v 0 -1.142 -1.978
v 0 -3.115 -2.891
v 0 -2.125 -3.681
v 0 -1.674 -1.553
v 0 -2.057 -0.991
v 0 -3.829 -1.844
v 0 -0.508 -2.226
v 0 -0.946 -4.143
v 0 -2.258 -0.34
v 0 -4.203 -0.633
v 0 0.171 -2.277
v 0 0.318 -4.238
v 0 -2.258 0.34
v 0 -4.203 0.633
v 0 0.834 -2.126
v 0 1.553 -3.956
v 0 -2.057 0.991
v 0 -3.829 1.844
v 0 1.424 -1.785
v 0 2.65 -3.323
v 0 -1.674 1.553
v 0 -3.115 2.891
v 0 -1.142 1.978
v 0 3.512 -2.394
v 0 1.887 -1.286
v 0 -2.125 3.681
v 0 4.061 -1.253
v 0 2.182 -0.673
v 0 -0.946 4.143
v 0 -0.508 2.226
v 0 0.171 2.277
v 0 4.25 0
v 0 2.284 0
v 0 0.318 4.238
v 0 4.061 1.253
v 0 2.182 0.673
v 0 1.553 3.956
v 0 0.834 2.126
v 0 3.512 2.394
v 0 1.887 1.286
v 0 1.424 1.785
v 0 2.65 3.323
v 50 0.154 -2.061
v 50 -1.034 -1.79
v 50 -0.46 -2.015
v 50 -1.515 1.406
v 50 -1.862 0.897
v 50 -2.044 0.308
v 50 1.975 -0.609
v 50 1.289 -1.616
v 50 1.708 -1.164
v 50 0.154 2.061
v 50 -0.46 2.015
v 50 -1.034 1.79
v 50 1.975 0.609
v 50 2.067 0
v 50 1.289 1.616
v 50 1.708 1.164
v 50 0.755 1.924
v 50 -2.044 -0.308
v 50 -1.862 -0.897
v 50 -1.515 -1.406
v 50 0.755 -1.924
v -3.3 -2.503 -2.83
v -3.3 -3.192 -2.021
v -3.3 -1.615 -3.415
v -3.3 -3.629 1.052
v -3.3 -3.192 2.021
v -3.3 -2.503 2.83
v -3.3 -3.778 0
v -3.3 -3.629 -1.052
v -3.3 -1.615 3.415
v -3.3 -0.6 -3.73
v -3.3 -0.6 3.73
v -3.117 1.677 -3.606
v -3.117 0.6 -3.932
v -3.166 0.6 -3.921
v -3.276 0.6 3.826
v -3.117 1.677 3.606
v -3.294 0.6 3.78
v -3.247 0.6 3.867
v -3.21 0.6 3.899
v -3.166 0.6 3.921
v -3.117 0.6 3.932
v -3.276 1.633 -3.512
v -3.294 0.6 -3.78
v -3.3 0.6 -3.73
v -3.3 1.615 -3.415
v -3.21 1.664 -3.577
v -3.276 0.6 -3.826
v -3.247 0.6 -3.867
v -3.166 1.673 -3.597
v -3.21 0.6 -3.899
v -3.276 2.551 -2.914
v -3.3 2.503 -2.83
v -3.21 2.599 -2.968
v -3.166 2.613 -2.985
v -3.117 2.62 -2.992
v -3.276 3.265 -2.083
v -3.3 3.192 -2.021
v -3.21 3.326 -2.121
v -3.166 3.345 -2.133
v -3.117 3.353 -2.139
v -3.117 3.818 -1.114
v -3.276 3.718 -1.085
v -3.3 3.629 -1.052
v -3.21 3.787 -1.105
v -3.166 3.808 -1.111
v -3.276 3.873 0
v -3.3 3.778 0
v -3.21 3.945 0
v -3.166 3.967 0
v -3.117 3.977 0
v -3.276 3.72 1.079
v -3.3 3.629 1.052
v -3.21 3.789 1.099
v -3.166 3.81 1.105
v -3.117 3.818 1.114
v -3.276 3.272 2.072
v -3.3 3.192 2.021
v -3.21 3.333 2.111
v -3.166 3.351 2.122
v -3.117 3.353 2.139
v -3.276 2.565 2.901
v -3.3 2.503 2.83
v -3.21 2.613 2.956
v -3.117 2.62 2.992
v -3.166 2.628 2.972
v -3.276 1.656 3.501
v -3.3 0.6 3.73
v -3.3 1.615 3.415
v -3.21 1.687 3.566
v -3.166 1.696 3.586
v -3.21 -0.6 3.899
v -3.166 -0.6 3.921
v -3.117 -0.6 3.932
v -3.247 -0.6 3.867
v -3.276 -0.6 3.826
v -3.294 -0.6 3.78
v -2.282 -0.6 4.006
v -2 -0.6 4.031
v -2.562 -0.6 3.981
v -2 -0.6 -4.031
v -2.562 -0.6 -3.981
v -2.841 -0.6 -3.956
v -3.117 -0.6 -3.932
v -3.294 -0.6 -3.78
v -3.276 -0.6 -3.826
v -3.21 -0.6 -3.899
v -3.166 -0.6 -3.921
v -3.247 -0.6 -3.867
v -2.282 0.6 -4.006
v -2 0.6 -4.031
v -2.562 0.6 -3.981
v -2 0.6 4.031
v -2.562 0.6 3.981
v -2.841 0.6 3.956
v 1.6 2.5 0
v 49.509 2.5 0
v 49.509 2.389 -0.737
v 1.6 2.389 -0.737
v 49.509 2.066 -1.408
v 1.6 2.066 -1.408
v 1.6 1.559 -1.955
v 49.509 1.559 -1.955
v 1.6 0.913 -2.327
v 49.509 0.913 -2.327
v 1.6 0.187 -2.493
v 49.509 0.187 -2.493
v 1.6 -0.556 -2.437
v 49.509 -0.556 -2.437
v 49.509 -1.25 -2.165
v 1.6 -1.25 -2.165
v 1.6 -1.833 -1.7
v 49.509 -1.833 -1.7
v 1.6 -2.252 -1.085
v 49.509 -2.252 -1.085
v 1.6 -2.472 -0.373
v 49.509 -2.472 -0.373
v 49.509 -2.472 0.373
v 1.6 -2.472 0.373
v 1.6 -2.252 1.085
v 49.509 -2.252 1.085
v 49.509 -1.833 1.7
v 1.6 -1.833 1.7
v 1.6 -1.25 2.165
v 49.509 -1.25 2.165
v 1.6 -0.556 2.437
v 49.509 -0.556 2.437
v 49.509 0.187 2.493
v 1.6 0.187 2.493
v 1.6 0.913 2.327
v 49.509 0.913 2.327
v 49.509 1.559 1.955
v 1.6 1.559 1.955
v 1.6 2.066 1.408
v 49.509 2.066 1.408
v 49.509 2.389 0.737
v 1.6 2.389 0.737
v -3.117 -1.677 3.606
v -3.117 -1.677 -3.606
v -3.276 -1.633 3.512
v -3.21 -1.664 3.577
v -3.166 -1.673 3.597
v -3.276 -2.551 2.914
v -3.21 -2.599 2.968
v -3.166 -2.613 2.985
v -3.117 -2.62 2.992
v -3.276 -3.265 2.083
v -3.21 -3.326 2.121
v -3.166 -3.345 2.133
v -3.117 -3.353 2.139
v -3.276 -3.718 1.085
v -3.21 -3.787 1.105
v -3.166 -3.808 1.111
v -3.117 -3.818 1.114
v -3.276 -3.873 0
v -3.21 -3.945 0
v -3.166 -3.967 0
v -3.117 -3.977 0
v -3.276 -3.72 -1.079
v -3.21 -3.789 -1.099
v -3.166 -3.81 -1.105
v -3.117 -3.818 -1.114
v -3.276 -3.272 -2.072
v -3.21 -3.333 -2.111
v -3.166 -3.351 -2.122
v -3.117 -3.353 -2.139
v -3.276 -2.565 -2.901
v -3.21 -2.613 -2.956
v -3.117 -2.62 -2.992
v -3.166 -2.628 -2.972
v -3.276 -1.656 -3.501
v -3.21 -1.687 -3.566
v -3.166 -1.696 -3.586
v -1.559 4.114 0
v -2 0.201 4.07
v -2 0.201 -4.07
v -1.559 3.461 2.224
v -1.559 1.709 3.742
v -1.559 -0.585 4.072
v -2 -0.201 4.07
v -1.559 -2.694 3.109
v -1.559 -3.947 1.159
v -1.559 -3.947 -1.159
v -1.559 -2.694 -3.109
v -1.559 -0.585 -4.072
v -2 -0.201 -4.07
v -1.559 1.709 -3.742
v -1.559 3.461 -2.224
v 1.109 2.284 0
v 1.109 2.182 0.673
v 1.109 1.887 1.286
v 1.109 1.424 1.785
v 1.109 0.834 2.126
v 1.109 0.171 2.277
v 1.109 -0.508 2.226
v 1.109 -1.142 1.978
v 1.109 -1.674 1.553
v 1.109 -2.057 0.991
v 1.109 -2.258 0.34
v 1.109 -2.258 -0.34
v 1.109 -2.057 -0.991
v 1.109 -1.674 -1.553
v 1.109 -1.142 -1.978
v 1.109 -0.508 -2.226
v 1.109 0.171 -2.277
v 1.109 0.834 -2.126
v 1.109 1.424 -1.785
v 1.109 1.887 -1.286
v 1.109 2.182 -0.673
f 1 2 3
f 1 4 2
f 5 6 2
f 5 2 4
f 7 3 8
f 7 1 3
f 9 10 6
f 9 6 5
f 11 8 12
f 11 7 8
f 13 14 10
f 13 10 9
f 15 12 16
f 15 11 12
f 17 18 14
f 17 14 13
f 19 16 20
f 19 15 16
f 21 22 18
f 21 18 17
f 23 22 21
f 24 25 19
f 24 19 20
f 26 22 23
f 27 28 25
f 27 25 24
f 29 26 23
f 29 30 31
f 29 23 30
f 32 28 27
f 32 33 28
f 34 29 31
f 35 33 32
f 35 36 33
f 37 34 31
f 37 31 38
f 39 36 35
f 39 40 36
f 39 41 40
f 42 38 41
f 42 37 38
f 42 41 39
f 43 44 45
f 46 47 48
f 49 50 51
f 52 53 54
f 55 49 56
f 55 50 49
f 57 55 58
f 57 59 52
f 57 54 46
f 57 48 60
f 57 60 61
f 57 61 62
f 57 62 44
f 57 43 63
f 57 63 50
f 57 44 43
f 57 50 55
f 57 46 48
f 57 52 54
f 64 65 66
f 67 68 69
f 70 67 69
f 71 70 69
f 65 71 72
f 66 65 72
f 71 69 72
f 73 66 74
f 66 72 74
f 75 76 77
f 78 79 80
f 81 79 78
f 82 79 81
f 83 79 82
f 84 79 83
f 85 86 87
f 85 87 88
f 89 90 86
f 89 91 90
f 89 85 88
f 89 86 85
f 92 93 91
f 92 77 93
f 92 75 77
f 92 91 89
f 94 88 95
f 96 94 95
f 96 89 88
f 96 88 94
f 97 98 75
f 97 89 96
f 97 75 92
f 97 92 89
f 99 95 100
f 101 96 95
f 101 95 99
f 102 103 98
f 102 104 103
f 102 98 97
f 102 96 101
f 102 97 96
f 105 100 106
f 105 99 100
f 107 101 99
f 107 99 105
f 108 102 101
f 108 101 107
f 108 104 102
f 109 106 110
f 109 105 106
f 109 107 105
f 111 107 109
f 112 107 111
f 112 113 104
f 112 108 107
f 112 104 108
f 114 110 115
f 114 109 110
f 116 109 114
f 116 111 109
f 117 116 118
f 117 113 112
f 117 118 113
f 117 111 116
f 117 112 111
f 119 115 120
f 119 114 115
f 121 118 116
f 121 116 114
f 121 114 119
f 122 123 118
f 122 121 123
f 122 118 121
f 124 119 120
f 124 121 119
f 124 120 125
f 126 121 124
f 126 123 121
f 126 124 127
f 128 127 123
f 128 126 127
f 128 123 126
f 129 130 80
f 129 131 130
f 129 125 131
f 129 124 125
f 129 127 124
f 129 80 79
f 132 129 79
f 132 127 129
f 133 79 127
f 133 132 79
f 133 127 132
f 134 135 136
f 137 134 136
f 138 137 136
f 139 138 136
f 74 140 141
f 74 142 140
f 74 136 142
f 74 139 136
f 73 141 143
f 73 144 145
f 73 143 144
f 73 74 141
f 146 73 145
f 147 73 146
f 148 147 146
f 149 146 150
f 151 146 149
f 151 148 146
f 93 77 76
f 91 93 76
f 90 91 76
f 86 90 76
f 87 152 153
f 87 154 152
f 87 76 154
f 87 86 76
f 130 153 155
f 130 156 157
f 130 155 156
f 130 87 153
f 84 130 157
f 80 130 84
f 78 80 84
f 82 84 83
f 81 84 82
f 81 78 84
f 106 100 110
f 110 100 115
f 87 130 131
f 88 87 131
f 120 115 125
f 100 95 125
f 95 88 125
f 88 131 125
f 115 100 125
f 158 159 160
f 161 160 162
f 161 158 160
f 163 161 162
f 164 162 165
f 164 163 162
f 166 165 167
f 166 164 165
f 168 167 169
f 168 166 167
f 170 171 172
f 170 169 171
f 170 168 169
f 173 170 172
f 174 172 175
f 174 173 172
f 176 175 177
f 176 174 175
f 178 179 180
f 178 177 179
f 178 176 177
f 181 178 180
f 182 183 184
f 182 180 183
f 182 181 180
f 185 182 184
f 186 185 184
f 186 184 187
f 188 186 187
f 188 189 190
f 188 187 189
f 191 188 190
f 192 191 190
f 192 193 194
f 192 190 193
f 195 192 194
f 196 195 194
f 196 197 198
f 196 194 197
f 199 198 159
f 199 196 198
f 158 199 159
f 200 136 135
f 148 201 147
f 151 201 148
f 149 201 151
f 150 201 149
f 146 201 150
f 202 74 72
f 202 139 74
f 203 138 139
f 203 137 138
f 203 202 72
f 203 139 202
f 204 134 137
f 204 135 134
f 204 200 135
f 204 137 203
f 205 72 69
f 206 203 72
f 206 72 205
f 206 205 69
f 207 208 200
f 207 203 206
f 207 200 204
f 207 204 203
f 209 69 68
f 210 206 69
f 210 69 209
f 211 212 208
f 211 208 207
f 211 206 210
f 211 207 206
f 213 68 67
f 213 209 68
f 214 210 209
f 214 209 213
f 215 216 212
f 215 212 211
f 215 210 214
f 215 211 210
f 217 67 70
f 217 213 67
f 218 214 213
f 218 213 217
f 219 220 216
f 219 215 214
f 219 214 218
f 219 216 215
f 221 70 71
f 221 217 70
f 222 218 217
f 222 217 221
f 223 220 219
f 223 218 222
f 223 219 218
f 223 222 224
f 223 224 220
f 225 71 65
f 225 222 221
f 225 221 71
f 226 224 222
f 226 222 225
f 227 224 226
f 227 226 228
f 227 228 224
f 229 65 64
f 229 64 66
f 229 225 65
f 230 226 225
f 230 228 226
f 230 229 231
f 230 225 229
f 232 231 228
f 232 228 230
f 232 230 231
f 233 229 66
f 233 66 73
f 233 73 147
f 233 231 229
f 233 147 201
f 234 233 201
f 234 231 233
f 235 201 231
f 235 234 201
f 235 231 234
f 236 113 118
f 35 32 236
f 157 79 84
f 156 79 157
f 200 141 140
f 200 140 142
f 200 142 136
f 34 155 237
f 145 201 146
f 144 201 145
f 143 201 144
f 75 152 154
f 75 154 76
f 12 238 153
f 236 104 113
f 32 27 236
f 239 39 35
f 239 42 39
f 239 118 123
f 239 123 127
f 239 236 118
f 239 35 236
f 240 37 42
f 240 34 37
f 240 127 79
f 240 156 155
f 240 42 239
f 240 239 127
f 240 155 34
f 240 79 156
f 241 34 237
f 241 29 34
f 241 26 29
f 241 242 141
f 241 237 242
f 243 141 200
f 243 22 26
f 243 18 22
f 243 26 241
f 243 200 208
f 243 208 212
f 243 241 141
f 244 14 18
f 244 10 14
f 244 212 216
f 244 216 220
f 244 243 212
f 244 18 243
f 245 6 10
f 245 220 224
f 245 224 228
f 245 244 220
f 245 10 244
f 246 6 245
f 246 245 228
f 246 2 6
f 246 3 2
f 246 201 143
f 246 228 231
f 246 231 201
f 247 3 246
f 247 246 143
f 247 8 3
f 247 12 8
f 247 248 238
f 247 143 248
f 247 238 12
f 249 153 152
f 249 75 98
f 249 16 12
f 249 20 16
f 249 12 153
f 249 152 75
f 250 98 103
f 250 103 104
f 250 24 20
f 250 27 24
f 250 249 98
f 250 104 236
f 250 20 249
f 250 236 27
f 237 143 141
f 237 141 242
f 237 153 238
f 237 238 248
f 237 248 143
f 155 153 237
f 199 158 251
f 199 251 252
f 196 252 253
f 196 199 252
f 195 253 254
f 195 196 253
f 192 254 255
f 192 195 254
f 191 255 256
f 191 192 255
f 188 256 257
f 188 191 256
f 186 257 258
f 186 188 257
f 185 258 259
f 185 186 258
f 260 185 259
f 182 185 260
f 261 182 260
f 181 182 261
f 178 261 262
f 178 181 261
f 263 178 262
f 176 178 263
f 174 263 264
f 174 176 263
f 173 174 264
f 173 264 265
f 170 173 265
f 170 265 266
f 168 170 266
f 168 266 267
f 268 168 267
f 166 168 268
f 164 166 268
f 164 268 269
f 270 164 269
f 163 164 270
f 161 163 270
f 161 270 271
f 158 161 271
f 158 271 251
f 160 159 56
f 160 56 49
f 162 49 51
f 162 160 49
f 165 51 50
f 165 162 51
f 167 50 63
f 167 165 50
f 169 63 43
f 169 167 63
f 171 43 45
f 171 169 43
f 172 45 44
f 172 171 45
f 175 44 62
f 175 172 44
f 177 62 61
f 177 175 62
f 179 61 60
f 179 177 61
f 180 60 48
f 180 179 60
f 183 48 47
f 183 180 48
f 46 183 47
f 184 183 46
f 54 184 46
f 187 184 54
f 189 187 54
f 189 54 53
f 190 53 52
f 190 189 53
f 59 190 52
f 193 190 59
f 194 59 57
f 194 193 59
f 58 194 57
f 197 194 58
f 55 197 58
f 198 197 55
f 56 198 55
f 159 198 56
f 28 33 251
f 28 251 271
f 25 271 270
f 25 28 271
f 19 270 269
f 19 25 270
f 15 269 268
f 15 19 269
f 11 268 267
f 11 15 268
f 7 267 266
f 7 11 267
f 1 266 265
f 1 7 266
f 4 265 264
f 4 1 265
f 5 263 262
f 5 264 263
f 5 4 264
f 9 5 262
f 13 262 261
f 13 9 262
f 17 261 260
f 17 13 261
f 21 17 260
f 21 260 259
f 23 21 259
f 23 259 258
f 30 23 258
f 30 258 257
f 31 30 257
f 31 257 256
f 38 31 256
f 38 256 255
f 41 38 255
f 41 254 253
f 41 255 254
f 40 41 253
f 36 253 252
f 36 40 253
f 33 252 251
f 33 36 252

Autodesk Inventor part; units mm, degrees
ref_plane "YZ Plane" through (0, 0, 0) normal (1, 0, 0) x (0, 1, 0)
ref_plane "XZ Plane" through (0, 0, 0) normal (0, 1, 0) x (-1, 0, 0)
sketch "Sketch1" plane through (0, 0, 0) normal (0, 0, 1) x (1, 0, 0)
  line L0 (-3.3, 0) -> (50, 0)
  line L1 (50, 0) -> (50, 2.5)
  line L2 (50, 2.5) -> (1.6, 2.5)
  line L3 (1.6, 2.5) -> (1.1091, 2.2835)
  line L4 (1.1091, 2.2835) -> (0, 2.2835)
  line L5 (0, 2.2835) -> (0, 4.25)
  line L6 (-13.96, 0) -> (60.66, 0) projected
  line L7 (0, -0.85) -> (0, 5.1) projected
  line L8 (-3.3, 0) -> (-3.3, 3.9613)
  line L9 (0, 4.25) -> (-3.3, 3.9613)
  line L10 (1.6, 2.5) -> (0, 2.5) construction
  dimension "d0" = 50
  dimension "d1" = 48.4
  dimension "d2" = 0.4909
  dimension "d3" = 3.3
  dimension "d4" = 5
  dimension "d5" = 4.567
  dimension "d9" = 8.5
  dimension "d10" = 5
revolve "Body" add sketch "Sketch1" angle 360 about axis through (-3.3, 0, 0) along (1, 0, 0)
sketch "Sketch2" plane through (-3.3, 0, 0) normal (-1, 0, 0) x (0, 0, 1)
  circle A0 centre (0, 0) radius 4.25 projected
  line L0 (0, 0) -> (0, 3.9613) projected
  line L1 (-4.25, 0.6) -> (4.25, 0.6)
  line L2 (4.25, 0.6) -> (4.25, -0.6)
  line L3 (4.25, -0.6) -> (-4.25, -0.6)
  line L4 (-4.25, -0.6) -> (-4.25, 0.6)
  line L5 (-4.25, 0) -> (4.25, 0) construction
  line L6 (0, 0.6) -> (0, -0.6) construction
  point P0 (0, 0)
  dimension "d11" = 1.2
  dimension "d12" = 8.5
fillet "Fillet1" radius 0.2 1 edges at (-3.3, -3.9613, 0)
extrude "Slot" cut sketch "Sketch2" against normal blind 1.3 contours A0 L3 L1 | L2 L3 A0 | A0 L1 L2 | A0 L4 L1 | L3 L4 A0
thread "Thread" size "M5x0.8" class "6g" standard "ISO Metric profile" length 48.4
chamfer "Chamfer1" distance 0.433 distance2 0.4909 1 edges at (50, -2.5, 0) measured on face at (50, -0.4809, -0.0271)
ref_plane "Work Plane1" through (30.1625, 0, 0) normal (0, 0, -1) x (1, 0, 0)
equation "\"d11\" = SBR"
equation "\"d12\" = KOD"
equation "\"d14\" = RR"
equation "\"d19\" = STI"
equation "\"d15\" = GEL"
equation "\"d17\" = -0.5 * SPD + 0.5 * GD"
equation "\"d0\" = NLG"
equation "\"d1\" = GEL"
equation "\"d3\" = KOH"
equation "\"d4\" = GD"
equation "\"d5\" = BDM"
equation "\"d9\" = KOD"
equation "\"d10\" = KEWI"
equation "\"GD\" = 5"
equation "\"NLG\" = 50"
equation "\"GEL\" = 48.4"
equation "\"KOD\" = 8.5"
equation "\"KOH\" = 3.3"
equation "\"GAL\" = 0.61345 * PTC"
equation "\"SPD\" = 4.13397"
equation "\"BDM\" = 4.56699"
equation "\"GUL\" = 0.61345 * PTC"
equation "\"RR\" = 0.2"
equation "\"SBR\" = 1.2"
equation "\"STI\" = 1.3"
equation "\"KEWI\" = 5deg"
equation "\"PTC\" = 0.8"
equation "\"THREADDIA\" = 5"
equation "\"TOA\" = 30deg"
equation "\"NND\" = 5"
equation "\"GD1\" = THREADDIA - 1.2269 * PTC"
properties part number "DIN 84 - M5 x 50" material "Steel, Mild"
